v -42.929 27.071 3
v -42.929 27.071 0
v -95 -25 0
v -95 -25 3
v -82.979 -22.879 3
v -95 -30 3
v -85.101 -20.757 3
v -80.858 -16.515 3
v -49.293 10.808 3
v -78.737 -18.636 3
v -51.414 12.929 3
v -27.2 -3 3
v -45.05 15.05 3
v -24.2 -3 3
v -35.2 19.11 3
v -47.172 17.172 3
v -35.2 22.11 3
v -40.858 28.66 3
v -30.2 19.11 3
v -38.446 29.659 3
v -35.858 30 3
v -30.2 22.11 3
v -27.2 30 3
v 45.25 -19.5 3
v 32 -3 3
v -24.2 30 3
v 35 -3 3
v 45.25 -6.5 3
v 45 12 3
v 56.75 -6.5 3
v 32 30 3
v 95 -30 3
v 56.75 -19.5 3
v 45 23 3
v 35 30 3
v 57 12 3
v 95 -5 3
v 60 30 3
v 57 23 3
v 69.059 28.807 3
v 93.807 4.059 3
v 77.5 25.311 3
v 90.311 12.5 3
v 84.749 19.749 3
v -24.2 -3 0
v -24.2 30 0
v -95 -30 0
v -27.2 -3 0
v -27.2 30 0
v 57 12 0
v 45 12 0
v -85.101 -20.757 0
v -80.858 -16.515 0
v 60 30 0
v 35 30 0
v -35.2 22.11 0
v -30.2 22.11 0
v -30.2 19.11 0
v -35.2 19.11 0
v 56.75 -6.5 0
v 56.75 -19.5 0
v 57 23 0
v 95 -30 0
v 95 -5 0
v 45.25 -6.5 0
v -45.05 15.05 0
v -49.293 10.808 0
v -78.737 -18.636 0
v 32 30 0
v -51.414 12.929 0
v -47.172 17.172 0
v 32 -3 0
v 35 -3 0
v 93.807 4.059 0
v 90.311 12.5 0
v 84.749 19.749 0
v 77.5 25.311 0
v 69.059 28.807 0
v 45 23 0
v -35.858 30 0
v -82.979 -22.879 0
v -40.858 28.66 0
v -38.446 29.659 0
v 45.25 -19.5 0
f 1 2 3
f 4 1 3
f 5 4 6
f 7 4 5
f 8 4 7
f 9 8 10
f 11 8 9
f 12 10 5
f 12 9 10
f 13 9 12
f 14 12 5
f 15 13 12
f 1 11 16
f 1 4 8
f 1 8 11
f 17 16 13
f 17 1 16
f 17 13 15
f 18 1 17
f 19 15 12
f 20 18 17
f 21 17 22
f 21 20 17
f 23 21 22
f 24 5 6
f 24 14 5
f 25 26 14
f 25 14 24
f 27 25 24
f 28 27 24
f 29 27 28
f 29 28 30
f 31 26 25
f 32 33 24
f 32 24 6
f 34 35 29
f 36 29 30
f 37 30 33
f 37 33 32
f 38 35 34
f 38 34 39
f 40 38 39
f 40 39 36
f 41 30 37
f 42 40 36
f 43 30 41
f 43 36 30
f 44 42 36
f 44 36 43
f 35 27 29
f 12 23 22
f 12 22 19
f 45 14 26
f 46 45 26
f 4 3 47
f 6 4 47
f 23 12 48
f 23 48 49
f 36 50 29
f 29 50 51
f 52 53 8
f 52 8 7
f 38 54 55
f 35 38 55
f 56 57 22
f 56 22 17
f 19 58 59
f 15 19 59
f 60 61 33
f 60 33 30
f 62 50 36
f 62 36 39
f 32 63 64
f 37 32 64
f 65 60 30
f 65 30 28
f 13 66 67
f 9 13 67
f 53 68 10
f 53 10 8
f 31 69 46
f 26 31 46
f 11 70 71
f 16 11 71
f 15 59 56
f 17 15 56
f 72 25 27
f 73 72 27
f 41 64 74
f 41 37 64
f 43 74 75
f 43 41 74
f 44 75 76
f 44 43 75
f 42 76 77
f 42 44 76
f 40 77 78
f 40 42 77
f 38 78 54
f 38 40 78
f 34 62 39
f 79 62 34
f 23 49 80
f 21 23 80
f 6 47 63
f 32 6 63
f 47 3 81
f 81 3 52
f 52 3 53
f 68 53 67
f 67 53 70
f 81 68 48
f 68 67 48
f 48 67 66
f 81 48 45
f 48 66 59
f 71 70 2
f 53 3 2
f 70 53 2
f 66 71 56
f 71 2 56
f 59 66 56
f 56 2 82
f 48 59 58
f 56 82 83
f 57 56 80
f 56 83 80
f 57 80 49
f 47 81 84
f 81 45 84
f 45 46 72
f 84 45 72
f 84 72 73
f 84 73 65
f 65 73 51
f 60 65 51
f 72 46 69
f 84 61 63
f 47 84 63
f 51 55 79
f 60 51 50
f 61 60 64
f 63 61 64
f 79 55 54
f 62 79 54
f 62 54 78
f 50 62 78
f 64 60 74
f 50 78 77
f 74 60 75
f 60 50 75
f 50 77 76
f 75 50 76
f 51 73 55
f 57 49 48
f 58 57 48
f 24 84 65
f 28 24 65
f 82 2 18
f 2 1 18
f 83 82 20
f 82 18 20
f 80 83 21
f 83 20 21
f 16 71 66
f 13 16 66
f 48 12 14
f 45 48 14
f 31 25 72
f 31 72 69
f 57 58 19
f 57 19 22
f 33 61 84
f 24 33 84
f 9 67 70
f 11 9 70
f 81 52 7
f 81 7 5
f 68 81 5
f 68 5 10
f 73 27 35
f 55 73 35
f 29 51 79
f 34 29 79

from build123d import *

# Parameters (mm, degrees)
SALIENTE_EXTRUIR1_DEPTH = 3
REDONDEO1_R             = 35
CROQUIS2_W              = 3
CROQUIS2_H              = 33
CORTAR_EXTRUIR1_DEPTH   = 4
CROQUIS3_W              = 11.5
CROQUIS3_H              = 13
CORTAR_EXTRUIR2_DEPTH   = 4
CROQUIS4_W              = 12
CROQUIS4_H              = 11
CORTAR_EXTRUIR3_DEPTH   = 4
REDONDEO2_R             = 10
CORTAR_EXTRUIR4_DEPTH   = 4
CROQUIS6_W              = 5
CROQUIS6_H              = 3
CORTAR_EXTRUIR5_DEPTH   = 4


with BuildPart() as part:
    # Croquis1 → Saliente-Extruir1 (new body)
    with BuildSketch(Plane.XY):
        Polygon((-21.5, 30), (-40, 30), (-95, -25), (-95, -30), (-21.5, -30), (-18.5, -30), (95, -30), (95, 30), (-18.5, 30), align=None)
    extrude(amount=SALIENTE_EXTRUIR1_DEPTH)

    # Redondeo1
    redondeo1_edges = [part.edges().sort_by_distance(p)[0] for p in [
        (95, 30, 1.5),
    ]]
    fillet(redondeo1_edges, radius=REDONDEO1_R)

    # Croquis2 → Cortar-Extruir1 (cut, through all)
    with BuildSketch(Plane.XY.offset(3)):
        with Locations((33.5, 13.5)):
            Rectangle(CROQUIS2_W, CROQUIS2_H)
        with Locations((-25.7, 13.5)):
            Rectangle(CROQUIS2_W, CROQUIS2_H)
    extrude(amount=-CORTAR_EXTRUIR1_DEPTH, mode=Mode.SUBTRACT)

    # Croquis3 → Cortar-Extruir2 (cut, through all)
    with BuildSketch(Plane(origin=(0, 0, 0), x_dir=(-1, 0, 0), z_dir=(0, 0, -1))):
        with Locations((-51, -13)):
            Rectangle(CROQUIS3_W, CROQUIS3_H)
    extrude(amount=-CORTAR_EXTRUIR2_DEPTH, mode=Mode.SUBTRACT)

    # Croquis4 → Cortar-Extruir3 (cut, through all)
    with BuildSketch(Plane(origin=(0, 0, 0), x_dir=(-1, 0, 0), z_dir=(0, 0, -1))):
        with Locations((-51, 17.5)):
            Rectangle(CROQUIS4_W, CROQUIS4_H)
    extrude(amount=-CORTAR_EXTRUIR3_DEPTH, mode=Mode.SUBTRACT)

    # Redondeo2
    redondeo2_edges = [part.edges().sort_by_distance(p)[0] for p in [
        (-40, 30, 1.5),
    ]]
    fillet(redondeo2_edges, radius=REDONDEO2_R)

    # Croquis5 → Cortar-Extruir4 (cut, through all)
    with BuildSketch(Plane(origin=(0, 0, 0), x_dir=(-1, 0, 0), z_dir=(0, 0, -1))):
        Polygon((47.171572875, 17.171572875), (45.050252532, 15.050252532), (49.292893219, 10.807611845), (51.414213562, 12.928932188), align=None)
        Polygon((85.100505063, -20.757359313), (82.97918472, -22.878679656), (78.736544033, -18.636038969), (80.857864376, -16.514718626), align=None)
    extrude(amount=-CORTAR_EXTRUIR4_DEPTH, mode=Mode.SUBTRACT)

    # Croquis6 → Cortar-Extruir5 (cut, through all)
    with BuildSketch(Plane(origin=(0, 0, 0), x_dir=(-1, 0, 0), z_dir=(0, 0, -1))):
        with Locations((32.7, 20.61)):
            Rectangle(CROQUIS6_W, CROQUIS6_H)
    extrude(amount=-CORTAR_EXTRUIR5_DEPTH, mode=Mode.SUBTRACT)


solid = part.part
